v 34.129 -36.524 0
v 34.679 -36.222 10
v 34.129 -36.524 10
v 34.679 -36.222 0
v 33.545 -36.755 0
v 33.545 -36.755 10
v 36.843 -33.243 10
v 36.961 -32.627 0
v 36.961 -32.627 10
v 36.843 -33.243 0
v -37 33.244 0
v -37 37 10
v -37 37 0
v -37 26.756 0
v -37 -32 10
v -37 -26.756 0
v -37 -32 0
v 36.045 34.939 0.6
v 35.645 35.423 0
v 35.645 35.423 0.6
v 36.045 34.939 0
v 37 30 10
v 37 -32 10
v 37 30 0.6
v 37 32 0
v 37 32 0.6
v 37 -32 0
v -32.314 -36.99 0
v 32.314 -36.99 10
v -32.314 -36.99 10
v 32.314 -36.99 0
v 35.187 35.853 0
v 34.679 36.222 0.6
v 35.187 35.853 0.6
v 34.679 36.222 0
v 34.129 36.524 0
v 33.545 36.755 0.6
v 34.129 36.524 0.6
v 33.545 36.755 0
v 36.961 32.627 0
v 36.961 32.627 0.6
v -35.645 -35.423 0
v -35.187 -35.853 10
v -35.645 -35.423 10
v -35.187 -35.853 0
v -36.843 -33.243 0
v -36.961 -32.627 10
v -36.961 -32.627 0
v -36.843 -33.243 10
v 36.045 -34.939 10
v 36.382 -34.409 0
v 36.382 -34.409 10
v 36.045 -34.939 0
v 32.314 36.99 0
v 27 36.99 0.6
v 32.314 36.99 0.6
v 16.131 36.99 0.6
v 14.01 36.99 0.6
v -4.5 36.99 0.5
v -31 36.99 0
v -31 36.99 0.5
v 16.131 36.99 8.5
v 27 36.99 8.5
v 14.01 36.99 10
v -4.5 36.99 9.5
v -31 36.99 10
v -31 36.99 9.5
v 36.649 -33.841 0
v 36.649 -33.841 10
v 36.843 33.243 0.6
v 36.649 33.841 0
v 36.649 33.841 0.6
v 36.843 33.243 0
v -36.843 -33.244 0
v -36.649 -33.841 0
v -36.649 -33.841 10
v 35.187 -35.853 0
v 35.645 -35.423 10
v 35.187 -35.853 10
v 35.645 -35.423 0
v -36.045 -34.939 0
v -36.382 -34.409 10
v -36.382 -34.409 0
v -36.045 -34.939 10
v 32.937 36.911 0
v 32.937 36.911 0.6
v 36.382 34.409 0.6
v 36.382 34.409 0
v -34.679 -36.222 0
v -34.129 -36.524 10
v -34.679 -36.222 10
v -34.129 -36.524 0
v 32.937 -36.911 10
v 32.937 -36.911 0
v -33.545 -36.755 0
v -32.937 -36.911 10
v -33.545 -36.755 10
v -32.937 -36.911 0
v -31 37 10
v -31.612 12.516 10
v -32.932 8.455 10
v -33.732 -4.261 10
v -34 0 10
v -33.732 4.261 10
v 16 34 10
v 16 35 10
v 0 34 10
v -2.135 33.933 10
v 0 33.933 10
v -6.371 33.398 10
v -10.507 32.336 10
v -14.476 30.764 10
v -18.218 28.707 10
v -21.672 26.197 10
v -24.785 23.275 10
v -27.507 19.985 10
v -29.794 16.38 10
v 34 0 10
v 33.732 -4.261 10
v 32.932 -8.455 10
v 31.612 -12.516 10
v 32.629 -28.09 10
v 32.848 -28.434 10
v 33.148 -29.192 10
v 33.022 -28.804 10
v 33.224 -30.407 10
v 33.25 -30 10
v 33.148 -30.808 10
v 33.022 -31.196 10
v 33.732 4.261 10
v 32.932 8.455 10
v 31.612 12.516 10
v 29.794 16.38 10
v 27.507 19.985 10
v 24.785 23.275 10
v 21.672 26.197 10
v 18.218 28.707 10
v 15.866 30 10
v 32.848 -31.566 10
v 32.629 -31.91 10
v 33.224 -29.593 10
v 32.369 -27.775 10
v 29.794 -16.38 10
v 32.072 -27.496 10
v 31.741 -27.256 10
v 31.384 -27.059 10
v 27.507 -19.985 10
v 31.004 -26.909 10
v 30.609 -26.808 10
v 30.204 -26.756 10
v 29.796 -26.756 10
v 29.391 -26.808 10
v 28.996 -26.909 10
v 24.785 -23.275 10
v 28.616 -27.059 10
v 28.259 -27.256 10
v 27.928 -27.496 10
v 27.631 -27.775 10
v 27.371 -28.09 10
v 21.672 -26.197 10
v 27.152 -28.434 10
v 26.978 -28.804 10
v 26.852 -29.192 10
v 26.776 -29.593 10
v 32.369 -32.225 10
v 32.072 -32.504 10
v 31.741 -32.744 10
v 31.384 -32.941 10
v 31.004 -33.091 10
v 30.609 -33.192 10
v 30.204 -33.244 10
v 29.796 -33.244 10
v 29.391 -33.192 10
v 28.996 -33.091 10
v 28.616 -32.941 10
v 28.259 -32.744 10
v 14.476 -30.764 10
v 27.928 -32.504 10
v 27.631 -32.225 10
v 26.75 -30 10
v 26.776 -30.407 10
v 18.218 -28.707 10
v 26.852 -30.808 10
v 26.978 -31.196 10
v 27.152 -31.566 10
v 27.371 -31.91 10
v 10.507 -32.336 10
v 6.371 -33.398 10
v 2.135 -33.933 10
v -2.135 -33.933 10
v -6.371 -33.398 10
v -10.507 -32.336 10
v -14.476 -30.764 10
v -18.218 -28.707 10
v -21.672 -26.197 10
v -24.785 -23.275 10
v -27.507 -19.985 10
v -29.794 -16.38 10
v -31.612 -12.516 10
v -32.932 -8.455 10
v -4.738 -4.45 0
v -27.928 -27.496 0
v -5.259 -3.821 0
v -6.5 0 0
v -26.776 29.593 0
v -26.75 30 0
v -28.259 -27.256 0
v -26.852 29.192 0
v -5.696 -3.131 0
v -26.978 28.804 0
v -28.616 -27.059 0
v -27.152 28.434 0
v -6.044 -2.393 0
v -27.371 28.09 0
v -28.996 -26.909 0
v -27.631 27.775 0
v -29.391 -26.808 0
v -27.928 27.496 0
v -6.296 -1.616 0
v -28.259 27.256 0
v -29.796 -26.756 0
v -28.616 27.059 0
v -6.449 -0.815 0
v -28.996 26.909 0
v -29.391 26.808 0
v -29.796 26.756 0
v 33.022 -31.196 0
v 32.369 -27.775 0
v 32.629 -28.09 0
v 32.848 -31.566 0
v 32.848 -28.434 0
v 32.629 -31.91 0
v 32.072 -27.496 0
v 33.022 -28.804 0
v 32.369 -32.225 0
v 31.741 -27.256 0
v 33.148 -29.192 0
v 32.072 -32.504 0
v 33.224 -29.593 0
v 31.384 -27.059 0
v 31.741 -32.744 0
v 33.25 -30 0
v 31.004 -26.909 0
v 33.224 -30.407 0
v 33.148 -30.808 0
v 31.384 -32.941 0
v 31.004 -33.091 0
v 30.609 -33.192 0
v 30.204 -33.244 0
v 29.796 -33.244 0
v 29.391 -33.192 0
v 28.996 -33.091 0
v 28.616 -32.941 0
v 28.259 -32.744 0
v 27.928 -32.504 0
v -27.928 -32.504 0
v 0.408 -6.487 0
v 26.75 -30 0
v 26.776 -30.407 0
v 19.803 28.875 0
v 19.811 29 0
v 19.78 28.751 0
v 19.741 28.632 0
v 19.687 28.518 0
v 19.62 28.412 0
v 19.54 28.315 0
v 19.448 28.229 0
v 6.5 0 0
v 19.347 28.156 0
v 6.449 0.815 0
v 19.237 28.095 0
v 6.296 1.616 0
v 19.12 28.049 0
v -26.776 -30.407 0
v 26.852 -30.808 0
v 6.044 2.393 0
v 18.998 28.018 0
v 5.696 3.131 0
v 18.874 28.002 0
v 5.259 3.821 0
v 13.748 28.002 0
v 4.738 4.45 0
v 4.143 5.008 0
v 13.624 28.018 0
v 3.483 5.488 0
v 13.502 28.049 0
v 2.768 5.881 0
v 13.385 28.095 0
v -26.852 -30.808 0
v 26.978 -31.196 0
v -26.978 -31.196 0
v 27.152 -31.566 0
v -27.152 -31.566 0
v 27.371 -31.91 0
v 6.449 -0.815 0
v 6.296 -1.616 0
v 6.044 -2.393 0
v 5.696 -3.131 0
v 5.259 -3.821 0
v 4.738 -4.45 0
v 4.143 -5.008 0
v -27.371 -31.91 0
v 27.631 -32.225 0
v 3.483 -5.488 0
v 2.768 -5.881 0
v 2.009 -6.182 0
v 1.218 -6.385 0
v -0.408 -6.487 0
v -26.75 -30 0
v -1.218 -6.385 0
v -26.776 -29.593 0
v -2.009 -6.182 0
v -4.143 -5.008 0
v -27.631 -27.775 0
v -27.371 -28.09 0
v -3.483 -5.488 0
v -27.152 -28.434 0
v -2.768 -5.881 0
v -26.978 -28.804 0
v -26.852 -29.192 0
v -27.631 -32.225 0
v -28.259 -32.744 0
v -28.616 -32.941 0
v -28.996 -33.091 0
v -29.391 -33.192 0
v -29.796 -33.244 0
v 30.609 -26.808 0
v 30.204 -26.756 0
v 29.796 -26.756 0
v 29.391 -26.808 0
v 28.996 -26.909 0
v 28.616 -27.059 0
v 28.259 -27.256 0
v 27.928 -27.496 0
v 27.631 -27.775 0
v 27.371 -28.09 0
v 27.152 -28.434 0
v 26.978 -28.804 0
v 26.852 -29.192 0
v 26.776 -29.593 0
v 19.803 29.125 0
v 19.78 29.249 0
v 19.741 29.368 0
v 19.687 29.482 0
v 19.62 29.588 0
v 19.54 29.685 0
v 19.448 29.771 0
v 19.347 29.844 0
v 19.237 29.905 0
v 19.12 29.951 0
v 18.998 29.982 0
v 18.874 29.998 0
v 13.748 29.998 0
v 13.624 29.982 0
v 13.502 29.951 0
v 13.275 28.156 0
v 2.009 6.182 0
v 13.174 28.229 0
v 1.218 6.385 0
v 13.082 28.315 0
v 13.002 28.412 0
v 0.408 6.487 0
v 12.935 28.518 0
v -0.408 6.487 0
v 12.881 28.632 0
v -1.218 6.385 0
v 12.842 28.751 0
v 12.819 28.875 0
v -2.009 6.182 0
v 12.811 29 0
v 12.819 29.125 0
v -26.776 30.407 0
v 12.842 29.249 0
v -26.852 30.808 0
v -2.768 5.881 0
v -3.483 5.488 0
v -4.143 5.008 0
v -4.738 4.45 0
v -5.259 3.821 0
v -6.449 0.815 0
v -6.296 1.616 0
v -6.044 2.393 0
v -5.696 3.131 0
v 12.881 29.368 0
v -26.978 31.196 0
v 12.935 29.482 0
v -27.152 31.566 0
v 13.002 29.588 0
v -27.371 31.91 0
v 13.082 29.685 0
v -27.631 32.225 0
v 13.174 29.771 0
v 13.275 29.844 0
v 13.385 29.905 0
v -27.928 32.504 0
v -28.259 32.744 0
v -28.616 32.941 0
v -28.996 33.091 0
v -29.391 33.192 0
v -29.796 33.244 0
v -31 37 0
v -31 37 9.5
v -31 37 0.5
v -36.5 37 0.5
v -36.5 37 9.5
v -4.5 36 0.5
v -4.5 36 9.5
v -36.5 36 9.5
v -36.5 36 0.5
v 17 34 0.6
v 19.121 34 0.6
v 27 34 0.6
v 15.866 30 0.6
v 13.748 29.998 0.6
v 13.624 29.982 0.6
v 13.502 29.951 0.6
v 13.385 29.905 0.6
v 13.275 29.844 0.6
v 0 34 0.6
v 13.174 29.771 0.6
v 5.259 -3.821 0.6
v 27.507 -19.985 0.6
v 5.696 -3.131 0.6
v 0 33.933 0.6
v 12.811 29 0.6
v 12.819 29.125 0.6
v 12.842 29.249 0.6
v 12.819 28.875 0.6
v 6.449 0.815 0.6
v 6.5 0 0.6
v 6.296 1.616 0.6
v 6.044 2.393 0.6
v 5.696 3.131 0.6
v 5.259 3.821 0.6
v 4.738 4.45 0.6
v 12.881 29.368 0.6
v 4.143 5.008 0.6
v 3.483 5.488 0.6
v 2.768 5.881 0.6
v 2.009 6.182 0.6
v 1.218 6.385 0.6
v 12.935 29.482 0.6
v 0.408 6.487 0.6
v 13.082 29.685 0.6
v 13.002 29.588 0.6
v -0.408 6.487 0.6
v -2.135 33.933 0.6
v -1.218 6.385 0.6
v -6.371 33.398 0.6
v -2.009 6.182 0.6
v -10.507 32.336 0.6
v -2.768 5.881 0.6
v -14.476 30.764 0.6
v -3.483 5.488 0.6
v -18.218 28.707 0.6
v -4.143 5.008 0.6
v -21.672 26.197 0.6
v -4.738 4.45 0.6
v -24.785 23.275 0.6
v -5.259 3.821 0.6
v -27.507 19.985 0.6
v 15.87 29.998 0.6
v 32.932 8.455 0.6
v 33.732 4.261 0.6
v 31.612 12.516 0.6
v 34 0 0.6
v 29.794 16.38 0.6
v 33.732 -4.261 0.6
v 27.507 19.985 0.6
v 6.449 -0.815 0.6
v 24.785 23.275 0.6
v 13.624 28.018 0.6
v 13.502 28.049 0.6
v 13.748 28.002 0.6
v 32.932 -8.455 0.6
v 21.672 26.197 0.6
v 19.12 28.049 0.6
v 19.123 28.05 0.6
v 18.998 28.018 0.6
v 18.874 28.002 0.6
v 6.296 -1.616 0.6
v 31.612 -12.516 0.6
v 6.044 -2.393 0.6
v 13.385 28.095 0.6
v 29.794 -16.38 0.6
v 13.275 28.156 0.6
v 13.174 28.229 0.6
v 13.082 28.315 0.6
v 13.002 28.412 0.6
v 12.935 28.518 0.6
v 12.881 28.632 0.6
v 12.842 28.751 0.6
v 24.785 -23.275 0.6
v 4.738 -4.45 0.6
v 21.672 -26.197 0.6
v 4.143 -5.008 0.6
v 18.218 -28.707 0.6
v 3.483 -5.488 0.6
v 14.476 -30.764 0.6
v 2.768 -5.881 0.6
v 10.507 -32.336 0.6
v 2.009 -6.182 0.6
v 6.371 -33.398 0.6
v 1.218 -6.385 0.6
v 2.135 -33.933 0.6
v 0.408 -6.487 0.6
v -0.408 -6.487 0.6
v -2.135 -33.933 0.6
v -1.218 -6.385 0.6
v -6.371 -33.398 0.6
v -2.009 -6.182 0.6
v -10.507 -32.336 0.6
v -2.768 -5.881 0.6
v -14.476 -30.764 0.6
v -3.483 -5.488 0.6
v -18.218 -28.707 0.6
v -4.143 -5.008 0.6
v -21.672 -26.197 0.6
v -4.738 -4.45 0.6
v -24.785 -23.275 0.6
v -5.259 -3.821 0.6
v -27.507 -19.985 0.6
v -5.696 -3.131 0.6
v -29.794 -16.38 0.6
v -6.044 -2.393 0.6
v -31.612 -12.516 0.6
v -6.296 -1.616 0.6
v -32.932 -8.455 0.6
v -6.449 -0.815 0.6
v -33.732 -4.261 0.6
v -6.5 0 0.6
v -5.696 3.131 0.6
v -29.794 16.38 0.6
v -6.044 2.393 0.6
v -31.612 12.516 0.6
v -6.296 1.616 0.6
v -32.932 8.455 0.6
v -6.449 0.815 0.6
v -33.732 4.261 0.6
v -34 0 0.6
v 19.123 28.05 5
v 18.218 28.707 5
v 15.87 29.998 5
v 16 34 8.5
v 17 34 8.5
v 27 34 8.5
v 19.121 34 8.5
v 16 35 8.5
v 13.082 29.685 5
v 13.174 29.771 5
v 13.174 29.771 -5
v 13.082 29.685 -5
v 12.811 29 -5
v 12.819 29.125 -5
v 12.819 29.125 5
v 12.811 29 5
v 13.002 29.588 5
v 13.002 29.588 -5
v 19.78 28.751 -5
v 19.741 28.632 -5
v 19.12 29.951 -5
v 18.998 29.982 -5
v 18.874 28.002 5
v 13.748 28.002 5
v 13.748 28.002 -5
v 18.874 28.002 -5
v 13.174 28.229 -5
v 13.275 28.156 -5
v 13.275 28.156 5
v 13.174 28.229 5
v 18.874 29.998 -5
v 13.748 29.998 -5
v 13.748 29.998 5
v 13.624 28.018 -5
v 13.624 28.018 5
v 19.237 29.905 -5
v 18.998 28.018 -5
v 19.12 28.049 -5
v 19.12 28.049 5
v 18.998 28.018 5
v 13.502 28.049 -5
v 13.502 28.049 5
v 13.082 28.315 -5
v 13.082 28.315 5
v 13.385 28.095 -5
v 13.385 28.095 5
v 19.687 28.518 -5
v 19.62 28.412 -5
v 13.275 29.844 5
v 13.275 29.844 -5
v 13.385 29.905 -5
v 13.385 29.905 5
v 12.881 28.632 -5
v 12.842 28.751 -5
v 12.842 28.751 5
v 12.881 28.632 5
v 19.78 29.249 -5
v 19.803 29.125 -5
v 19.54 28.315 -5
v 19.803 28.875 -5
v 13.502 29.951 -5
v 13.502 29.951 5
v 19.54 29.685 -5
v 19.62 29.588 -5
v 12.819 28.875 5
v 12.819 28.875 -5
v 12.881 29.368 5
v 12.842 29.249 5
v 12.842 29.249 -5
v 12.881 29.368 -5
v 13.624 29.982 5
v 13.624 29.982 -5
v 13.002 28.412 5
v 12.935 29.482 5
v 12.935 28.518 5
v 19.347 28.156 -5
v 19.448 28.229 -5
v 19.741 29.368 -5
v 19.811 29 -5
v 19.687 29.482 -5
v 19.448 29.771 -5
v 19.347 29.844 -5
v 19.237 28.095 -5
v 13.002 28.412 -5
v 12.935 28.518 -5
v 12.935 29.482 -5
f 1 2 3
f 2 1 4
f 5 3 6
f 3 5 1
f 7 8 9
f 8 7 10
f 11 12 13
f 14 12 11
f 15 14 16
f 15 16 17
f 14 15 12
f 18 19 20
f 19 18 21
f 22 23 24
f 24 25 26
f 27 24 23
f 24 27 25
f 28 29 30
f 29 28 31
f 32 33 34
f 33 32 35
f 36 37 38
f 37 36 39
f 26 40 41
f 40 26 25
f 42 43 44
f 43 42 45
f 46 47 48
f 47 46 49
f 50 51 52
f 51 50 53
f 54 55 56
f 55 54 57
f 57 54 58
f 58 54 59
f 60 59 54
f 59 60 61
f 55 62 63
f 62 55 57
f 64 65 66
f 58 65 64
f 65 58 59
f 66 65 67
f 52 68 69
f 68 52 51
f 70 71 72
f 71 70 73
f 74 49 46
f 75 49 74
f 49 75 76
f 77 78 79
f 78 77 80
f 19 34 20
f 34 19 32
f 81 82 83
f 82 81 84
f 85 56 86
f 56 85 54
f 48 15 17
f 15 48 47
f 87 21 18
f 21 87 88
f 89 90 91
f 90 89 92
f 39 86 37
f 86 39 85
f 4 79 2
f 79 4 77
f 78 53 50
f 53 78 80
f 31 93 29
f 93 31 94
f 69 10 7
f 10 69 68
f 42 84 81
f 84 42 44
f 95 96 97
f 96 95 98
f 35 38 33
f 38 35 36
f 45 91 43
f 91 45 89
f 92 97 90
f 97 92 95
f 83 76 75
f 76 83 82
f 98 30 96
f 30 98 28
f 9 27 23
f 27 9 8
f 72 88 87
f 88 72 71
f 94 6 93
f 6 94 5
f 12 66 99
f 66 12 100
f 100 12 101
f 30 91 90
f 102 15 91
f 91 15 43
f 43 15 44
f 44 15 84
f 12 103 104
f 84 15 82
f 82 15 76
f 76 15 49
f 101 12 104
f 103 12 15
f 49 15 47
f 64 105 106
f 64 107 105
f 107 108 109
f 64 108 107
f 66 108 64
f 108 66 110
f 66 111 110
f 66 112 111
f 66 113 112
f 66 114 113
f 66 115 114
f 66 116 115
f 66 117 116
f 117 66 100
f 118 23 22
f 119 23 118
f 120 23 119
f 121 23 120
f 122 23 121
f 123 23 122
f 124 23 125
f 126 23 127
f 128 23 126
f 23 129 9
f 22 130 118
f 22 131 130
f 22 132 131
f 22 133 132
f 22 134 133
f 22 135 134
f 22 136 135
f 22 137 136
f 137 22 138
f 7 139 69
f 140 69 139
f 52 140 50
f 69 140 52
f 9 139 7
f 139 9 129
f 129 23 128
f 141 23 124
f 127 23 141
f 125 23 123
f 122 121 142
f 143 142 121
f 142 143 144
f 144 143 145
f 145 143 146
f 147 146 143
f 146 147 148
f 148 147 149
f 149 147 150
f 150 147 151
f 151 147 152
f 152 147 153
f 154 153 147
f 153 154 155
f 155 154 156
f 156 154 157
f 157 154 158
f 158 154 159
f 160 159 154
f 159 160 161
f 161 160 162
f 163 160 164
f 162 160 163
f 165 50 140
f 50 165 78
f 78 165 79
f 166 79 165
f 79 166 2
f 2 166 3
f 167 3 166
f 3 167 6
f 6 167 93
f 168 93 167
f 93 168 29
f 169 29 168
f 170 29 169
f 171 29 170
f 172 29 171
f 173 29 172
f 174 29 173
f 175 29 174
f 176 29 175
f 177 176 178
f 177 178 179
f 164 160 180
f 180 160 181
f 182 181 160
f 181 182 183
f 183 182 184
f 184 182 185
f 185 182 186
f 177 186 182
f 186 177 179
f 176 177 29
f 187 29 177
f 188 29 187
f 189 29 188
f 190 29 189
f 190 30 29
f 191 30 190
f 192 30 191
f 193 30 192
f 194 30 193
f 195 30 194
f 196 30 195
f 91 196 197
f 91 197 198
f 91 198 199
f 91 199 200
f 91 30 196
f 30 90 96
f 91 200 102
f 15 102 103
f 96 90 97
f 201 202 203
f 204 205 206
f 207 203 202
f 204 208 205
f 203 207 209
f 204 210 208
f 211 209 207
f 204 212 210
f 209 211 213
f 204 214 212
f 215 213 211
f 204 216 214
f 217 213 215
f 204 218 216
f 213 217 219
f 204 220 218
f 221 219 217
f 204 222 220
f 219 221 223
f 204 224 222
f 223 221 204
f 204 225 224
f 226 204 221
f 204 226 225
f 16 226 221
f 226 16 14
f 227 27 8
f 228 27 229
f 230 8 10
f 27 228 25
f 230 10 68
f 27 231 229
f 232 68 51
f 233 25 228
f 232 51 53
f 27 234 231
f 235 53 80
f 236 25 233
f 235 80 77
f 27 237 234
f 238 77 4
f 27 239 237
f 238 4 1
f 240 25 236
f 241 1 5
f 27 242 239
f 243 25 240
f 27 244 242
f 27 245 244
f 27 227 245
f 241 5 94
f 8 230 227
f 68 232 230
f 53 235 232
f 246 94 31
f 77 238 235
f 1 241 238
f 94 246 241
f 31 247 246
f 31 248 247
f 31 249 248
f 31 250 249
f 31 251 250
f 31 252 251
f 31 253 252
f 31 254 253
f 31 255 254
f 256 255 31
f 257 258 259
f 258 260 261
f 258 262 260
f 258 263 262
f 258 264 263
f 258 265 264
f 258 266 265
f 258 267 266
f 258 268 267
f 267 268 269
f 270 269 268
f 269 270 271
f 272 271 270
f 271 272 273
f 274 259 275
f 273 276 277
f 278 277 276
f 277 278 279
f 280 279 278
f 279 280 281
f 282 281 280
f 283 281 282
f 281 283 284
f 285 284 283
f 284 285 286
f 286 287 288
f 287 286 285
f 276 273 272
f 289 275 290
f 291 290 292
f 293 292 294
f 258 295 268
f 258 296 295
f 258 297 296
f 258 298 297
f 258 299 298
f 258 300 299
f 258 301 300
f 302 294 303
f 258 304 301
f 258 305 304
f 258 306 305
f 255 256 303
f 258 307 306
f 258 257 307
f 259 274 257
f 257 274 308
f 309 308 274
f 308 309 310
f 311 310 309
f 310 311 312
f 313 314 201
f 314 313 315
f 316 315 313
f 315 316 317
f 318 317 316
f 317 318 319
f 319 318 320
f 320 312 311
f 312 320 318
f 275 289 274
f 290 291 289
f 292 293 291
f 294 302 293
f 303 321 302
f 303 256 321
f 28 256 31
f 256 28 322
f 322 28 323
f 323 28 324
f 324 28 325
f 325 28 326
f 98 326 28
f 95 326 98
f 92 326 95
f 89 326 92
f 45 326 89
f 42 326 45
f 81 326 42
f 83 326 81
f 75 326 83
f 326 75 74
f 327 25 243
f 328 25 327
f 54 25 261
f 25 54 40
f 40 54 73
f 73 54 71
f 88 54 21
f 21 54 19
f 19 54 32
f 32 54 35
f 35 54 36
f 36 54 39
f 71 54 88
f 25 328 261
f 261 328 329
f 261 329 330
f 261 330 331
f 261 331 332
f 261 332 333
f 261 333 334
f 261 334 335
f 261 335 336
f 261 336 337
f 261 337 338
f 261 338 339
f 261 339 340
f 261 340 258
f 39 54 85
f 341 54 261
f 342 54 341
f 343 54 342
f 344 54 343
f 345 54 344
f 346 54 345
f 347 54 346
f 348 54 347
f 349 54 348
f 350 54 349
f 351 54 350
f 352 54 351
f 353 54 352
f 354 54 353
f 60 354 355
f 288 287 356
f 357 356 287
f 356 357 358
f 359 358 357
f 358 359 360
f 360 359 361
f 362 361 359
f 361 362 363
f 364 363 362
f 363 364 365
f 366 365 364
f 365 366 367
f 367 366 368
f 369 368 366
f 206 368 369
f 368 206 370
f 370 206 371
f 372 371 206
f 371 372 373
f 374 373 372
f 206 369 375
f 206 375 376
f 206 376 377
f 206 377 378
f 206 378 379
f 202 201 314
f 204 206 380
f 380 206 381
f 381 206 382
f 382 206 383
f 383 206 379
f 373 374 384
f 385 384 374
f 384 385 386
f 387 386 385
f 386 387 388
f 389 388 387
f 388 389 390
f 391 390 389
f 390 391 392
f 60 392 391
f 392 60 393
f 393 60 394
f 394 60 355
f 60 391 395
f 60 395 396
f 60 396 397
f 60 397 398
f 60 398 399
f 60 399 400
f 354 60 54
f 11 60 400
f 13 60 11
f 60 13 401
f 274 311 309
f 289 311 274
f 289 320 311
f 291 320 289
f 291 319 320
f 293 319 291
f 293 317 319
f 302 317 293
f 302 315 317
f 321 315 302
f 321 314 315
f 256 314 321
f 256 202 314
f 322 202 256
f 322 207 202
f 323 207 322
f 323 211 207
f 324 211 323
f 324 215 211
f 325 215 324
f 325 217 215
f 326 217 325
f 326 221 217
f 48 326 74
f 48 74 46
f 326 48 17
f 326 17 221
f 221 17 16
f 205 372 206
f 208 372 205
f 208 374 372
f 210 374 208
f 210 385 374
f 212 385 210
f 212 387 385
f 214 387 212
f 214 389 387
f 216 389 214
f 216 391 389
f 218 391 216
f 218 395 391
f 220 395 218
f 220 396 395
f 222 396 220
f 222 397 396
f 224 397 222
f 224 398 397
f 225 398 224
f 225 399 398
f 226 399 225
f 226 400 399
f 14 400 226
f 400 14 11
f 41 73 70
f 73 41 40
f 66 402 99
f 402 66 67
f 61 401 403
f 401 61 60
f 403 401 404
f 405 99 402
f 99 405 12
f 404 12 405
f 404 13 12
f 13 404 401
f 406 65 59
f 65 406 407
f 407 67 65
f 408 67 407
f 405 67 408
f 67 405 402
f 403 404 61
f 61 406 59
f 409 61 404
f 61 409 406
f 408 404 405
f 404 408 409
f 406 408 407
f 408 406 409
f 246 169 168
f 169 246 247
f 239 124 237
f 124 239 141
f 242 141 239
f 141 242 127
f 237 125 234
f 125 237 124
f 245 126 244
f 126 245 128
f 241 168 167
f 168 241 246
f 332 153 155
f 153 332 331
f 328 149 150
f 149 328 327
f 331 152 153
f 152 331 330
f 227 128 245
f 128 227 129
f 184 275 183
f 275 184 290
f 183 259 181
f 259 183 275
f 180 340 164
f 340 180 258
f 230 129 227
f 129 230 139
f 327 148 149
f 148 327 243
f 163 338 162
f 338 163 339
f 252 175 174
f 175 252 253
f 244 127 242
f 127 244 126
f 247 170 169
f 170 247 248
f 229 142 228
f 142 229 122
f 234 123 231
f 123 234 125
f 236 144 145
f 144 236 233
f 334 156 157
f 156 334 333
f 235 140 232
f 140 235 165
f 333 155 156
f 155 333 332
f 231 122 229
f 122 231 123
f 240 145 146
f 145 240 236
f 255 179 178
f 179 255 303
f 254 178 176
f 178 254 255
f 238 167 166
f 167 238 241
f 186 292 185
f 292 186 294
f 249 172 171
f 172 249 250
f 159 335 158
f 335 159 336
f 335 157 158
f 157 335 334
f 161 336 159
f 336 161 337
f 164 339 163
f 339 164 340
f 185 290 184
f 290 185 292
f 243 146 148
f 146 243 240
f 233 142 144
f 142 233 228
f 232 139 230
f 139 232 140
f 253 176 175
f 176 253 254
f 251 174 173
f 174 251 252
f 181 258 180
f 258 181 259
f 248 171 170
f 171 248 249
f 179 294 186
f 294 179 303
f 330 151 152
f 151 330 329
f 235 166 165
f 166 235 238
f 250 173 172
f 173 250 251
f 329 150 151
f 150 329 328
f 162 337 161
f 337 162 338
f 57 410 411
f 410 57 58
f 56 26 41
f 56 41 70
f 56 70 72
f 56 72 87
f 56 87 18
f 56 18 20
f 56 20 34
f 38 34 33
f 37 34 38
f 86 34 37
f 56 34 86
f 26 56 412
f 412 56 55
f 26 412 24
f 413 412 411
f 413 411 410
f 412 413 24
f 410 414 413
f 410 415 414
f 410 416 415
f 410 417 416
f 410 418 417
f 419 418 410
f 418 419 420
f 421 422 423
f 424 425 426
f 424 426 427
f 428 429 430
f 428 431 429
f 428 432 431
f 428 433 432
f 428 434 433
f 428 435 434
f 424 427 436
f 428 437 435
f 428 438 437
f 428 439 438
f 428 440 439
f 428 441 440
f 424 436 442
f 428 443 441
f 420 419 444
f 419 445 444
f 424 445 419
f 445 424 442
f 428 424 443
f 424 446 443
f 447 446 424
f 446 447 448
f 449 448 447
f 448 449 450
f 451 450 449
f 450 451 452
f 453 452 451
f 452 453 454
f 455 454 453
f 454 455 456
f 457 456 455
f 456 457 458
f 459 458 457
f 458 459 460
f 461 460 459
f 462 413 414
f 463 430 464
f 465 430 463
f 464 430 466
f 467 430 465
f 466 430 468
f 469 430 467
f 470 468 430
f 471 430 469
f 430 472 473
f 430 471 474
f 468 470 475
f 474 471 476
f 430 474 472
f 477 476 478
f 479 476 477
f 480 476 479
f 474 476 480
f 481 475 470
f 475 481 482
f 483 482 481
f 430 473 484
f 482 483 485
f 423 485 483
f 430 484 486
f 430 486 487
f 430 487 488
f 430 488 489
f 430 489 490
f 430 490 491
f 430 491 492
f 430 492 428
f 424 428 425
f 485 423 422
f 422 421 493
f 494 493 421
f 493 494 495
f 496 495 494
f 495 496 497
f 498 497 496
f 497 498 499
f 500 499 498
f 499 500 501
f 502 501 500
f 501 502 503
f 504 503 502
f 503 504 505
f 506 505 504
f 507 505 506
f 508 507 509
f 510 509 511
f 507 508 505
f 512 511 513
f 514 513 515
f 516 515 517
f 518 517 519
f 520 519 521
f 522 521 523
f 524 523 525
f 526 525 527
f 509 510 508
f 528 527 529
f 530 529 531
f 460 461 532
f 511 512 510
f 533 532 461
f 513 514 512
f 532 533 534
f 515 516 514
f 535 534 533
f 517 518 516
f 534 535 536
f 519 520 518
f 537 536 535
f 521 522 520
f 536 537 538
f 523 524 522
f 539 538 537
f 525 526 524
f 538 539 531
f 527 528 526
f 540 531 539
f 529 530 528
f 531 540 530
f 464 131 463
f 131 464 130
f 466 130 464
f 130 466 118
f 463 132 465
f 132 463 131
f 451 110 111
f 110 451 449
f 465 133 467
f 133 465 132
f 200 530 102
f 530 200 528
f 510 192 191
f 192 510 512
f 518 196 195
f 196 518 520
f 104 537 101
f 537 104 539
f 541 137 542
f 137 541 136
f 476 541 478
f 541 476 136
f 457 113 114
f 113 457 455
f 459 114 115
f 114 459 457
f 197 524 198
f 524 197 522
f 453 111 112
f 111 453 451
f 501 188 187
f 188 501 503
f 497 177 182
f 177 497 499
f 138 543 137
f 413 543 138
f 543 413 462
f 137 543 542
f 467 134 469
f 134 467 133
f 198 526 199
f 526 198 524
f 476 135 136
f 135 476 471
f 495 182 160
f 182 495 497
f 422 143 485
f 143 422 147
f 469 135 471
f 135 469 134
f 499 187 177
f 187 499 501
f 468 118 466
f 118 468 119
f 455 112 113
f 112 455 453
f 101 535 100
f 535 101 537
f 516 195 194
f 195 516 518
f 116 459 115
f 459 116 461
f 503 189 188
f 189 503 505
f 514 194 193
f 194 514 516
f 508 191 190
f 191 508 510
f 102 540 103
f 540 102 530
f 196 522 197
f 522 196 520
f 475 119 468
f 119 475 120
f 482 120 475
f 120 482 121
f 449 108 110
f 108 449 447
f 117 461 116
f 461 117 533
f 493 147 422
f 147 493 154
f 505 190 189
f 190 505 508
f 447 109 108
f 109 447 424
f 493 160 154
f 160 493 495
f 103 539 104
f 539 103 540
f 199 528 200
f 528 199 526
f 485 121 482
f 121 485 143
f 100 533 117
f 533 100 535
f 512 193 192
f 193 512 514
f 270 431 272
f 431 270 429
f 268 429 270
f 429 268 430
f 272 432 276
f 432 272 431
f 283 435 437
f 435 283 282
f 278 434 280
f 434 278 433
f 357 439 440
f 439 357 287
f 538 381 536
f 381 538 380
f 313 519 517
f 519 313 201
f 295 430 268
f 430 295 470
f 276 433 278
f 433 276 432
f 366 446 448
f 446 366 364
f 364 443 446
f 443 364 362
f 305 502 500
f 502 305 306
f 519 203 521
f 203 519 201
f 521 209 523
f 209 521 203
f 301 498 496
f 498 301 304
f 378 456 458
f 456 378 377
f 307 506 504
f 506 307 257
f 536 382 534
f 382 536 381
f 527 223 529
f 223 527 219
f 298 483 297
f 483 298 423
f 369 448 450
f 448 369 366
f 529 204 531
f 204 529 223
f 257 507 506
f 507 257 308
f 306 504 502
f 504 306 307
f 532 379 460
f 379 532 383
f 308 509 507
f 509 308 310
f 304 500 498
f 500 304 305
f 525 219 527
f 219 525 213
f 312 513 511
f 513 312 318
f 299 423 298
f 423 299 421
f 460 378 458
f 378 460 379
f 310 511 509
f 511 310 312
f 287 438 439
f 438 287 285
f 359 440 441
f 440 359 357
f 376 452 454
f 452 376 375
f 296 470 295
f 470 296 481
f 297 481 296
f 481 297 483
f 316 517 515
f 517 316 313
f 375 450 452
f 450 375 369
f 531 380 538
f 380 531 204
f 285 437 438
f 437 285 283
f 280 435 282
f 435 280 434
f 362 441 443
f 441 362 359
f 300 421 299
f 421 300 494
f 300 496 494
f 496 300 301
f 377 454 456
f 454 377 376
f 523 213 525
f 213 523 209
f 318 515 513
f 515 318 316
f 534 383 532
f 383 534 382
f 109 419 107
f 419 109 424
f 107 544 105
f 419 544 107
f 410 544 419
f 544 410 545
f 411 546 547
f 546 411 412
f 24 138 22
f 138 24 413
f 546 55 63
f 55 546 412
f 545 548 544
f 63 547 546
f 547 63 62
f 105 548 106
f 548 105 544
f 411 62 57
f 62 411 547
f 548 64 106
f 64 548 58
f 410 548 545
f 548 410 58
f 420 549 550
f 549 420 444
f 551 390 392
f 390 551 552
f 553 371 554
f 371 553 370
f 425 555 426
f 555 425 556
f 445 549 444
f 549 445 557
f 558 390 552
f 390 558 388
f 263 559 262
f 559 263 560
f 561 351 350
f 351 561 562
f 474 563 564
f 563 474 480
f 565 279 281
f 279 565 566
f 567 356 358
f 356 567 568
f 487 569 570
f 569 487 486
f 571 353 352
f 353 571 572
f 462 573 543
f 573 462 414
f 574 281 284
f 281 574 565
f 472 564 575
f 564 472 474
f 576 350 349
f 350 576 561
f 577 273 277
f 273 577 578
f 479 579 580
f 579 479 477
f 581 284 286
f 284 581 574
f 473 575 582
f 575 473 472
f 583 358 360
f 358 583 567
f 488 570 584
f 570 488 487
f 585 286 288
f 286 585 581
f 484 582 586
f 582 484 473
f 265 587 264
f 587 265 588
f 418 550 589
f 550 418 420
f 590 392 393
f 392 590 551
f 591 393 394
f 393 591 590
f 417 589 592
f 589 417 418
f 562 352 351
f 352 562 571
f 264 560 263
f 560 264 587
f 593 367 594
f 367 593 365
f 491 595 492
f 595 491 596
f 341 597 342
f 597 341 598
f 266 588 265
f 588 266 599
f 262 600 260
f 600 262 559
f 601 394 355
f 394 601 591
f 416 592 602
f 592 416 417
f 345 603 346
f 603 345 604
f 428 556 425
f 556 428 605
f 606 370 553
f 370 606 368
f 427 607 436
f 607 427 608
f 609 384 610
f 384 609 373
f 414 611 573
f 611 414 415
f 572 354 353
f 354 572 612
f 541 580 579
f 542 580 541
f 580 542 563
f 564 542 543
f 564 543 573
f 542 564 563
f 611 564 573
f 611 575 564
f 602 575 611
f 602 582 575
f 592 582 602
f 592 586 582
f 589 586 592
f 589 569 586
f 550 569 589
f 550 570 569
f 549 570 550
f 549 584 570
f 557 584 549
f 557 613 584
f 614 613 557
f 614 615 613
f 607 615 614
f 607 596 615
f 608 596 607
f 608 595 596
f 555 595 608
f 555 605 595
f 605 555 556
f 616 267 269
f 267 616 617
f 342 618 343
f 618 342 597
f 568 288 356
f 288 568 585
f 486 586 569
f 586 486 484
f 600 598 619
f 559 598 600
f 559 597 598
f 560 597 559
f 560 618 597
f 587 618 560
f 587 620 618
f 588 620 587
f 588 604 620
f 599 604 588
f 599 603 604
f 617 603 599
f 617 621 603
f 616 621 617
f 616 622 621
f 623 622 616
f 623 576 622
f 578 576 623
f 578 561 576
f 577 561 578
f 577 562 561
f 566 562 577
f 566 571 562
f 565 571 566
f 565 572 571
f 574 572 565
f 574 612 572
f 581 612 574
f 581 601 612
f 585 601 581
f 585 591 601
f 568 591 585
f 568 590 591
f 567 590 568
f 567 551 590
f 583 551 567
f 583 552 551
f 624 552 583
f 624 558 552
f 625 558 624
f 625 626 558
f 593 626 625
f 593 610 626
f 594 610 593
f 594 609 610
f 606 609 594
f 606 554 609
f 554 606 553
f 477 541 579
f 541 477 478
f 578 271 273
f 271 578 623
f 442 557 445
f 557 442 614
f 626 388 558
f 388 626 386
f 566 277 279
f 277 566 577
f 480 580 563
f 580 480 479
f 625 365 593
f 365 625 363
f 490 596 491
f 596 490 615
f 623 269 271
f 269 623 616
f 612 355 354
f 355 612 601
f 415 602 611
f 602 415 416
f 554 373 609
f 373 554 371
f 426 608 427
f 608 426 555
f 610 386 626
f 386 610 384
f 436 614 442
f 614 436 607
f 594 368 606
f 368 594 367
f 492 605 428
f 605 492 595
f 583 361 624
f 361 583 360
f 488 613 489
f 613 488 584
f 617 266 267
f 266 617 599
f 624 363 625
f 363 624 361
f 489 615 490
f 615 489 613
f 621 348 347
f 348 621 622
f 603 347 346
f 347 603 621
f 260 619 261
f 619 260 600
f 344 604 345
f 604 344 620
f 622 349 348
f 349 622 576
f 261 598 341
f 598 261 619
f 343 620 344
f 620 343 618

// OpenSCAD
$fn = 50;


union() {
	difference() {
		union() {
			hull() {
				translate(v = [-32.0000000000, 32.0000000000, 0]) {
					cylinder(h = 10, r = 5);
				}
				translate(v = [32.0000000000, 32.0000000000, 0]) {
					cylinder(h = 10, r = 5);
				}
				translate(v = [-32.0000000000, -32.0000000000, 0]) {
					cylinder(h = 10, r = 5);
				}
				translate(v = [32.0000000000, -32.0000000000, 0]) {
					cylinder(h = 10, r = 5);
				}
			}
			translate(v = [-37.0000000000, 31.0000000000, 0]) {
				cube(size = [6, 6, 10]);
			}
		}
		union() {
			translate(v = [-37.5000000000, -30.0000000000, -250.0000000000]) {
				rotate(a = [0, 0, 0]) {
					difference() {
						union() {
							hull() {
								translate(v = [7.5000000000, 0, 0]) {
									cylinder(h = 250, r = 3.2500000000, r1 = 3.2500000000, r2 = 3.2500000000);
								}
								translate(v = [-7.5000000000, 0, 0]) {
									cylinder(h = 250, r = 3.2500000000, r1 = 3.2500000000, r2 = 3.2500000000);
								}
							}
						}
						union();
					}
				}
			}
			translate(v = [-37.5000000000, 30.0000000000, -250.0000000000]) {
				rotate(a = [0, 0, 0]) {
					difference() {
						union() {
							hull() {
								translate(v = [7.5000000000, 0, 0]) {
									cylinder(h = 250, r = 3.2500000000, r1 = 3.2500000000, r2 = 3.2500000000);
								}
								translate(v = [-7.5000000000, 0, 0]) {
									cylinder(h = 250, r = 3.2500000000, r1 = 3.2500000000, r2 = 3.2500000000);
								}
							}
						}
						union();
					}
				}
			}
			translate(v = [-36.5000000000, 36.0000000000, 0.5000000000]) {
				cube(size = [32, 1, 9.0000000000]);
			}
			translate(v = [30.0000000000, -30.0000000000, 0]) {
				cylinder(h = 100, r = 3.2500000000);
			}
			translate(v = [0, 0, 0.6000000000]) {
				cylinder(h = 12.4000000000, r = 34.0000000000);
			}
			translate(v = [0, 0, -5.0000000000]) {
				cylinder(h = 10, r = 6.5000000000);
			}
			translate(v = [0.0000000000, 30.0000000000, 0.6000000000]) {
				cube(size = [37.0000000000, 4, 12.4000000000]);
			}
			translate(v = [27.0000000000, 30.0000000000, 0.6000000000]) {
				cube(size = [10, 7, 12.4000000000]);
			}
			translate(v = [16.0000000000, 30.0000000000, 8.5000000000]) {
				cube(size = [21, 7, 1.5000000000]);
			}
			translate(v = [13.2500000000, 37.7500000000, 0.6000000000]) {
				rotate(a = [0, 0, -45]) {
					cube(size = [7.5000000000, 1.5000000000, 12.4000000000]);
				}
			}
			translate(v = [7.0610000000, 28.0000000000, 0.6000000000]) {
				cube(size = [7.5000000000, 2, 9.4000000000]);
			}
		}
	}
	union() {
		translate(v = [16.3110000000, 29.0000000000, -5.0000000000]) {
			rotate(a = [0, 0, 0]) {
				difference() {
					union() {
						#hull() {
							#translate(v = [2.5000000000, 0, 0]) {
								cylinder(h = 10, r = 1.0000000000, r1 = 1.0000000000, r2 = 1.0000000000);
							}
							#translate(v = [-2.5000000000, 0, 0]) {
								cylinder(h = 10, r = 1.0000000000, r1 = 1.0000000000, r2 = 1.0000000000);
							}
						}
					}
					union();
				}
			}
		}
	}
}
